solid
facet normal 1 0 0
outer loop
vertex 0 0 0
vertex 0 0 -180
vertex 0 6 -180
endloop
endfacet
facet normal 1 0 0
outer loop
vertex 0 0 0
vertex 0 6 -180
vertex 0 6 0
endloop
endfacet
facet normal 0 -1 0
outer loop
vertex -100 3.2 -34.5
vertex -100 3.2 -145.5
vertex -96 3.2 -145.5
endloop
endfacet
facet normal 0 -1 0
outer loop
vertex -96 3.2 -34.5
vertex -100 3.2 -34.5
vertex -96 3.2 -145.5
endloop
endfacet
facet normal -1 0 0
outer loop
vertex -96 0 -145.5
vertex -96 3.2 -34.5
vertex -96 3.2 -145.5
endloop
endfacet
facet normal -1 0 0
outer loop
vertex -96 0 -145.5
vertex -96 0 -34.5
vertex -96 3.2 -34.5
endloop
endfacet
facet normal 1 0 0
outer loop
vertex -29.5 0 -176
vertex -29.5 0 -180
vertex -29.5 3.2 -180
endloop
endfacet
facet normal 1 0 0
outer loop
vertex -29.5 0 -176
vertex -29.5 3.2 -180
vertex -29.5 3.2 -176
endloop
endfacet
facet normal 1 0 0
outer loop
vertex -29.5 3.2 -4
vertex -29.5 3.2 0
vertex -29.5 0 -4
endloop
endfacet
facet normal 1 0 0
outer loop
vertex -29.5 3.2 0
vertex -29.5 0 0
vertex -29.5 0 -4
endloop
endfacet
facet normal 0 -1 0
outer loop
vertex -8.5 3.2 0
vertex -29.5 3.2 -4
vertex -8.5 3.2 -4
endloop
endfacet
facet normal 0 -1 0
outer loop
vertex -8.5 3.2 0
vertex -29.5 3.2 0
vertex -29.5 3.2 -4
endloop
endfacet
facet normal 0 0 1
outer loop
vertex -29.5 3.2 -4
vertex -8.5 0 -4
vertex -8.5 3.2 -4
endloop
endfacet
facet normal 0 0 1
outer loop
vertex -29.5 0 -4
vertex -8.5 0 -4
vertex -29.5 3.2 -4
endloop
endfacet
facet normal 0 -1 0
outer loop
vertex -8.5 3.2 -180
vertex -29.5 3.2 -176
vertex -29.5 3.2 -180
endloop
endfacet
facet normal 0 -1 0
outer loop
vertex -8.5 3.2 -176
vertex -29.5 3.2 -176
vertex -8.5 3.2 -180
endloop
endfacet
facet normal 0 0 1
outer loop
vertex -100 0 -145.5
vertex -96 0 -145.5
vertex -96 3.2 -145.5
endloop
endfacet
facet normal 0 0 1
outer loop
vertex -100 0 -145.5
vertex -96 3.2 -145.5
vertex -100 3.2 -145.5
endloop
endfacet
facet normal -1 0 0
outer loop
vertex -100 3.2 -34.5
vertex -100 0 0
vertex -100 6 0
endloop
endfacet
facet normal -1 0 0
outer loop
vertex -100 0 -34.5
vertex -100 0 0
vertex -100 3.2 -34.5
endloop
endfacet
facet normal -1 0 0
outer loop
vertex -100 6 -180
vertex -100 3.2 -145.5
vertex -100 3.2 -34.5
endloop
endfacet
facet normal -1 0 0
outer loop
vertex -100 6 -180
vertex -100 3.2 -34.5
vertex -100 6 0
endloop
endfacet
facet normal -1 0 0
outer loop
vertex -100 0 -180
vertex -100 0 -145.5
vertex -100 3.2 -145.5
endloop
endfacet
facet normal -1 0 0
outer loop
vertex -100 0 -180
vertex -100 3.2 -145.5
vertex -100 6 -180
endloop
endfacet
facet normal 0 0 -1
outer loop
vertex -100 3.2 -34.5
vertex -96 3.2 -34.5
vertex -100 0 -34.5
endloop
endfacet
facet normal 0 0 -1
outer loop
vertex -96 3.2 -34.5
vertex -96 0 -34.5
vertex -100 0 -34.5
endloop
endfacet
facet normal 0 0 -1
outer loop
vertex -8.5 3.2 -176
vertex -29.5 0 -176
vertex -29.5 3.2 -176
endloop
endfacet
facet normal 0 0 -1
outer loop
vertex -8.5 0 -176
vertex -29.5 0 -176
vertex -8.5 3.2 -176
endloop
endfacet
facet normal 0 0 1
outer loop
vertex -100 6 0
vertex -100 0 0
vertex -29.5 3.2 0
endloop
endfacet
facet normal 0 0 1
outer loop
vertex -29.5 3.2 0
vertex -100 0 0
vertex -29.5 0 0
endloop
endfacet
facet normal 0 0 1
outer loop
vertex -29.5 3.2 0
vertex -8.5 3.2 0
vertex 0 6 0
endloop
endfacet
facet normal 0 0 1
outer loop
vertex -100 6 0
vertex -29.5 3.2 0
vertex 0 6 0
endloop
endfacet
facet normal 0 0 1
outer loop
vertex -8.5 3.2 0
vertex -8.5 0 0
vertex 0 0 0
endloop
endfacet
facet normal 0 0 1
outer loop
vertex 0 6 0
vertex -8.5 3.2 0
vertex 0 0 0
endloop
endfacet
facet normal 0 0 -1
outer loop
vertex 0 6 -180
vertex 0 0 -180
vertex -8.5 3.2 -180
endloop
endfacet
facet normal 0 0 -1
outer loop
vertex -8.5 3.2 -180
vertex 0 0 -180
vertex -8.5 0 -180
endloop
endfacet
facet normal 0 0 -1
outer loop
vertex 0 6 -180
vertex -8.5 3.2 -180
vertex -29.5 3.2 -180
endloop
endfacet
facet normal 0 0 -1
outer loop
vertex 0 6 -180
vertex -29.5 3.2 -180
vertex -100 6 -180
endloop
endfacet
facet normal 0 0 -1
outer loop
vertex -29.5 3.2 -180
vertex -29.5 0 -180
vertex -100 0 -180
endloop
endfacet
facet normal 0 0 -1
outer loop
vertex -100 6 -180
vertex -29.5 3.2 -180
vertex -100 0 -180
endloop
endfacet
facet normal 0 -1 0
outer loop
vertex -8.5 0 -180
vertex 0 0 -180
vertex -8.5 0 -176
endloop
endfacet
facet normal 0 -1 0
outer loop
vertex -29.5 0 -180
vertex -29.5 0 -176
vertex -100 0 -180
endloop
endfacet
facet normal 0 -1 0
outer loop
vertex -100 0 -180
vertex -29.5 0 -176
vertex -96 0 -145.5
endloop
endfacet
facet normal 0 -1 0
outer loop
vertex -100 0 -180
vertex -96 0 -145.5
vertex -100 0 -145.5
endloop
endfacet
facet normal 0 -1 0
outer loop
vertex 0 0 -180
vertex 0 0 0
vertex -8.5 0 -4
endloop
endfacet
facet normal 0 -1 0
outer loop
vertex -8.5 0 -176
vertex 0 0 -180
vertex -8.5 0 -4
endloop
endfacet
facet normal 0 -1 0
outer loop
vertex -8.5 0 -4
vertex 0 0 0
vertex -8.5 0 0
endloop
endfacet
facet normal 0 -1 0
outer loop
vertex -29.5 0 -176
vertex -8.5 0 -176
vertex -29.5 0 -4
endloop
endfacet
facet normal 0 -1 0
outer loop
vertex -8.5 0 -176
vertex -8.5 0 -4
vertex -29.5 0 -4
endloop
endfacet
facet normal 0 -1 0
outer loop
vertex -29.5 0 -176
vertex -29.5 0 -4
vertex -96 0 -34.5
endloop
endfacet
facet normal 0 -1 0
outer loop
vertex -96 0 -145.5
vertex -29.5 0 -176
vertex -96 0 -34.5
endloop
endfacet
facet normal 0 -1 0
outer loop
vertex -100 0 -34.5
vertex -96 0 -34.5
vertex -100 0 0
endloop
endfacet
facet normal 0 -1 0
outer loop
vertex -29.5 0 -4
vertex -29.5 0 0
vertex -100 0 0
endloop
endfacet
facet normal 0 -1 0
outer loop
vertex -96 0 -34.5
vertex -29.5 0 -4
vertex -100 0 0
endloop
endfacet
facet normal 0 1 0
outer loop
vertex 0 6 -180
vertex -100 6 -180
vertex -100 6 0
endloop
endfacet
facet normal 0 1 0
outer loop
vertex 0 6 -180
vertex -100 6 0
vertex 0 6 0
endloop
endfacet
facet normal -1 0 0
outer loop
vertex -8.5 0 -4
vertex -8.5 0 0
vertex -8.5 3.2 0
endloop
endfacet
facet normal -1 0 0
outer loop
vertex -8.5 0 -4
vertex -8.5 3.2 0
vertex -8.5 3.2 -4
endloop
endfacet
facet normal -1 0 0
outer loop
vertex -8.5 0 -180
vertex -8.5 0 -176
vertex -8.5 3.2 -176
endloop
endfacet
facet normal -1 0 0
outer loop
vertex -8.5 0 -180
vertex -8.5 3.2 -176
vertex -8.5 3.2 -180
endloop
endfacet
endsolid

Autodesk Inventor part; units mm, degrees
ref_plane "YZ Plane" through (0, 0, 0) normal (1, 0, 0) x (0, 1, 0)
ref_plane "XZ Plane" through (0, 0, 0) normal (0, 1, 0) x (-1, 0, 0)
ref_plane "XY Plane" through (0, 0, 0) normal (0, 0, 1) x (1, 0, 0)
sketch "Sketch1" plane through (0, 0, 0) normal (0, 1, 0) x (-1, 0, 0)
  line L0 (0, 0) -> (100, 0)
  line L1 (100, 0) -> (100, -180)
  line L2 (100, -180) -> (0, -180)
  line L3 (0, -180) -> (0, 0)
  dimension "d0" = 100
  dimension "d1" = 180
extrude "Extrusion1" add sketch "Sketch1" along normal blind 4
sketch "Sketch2" plane through (0, 4, 0) normal (0, 1, 0) x (1, 0, 0)
  line L0 (-100, 180) -> (-100, 0) projected
  line L1 (0, 180) -> (-100, 180) projected
  line L2 (-100, 0) -> (-96, 0)
  line L3 (-96, 0) -> (-96, 180)
  line L4 (-96, 180) -> (-100, 180)
  line L5 (-100, 180) -> (-100, 0)
  line L6 (0, 180) -> (-4, 180)
  line L7 (-4, 180) -> (-4, 0)
  line L8 (-4, 0) -> (0, 0)
  line L9 (0, 0) -> (0, 180)
  dimension "d4" = 4
  dimension "d5" = 4
extrude "Extrusion2" add sketch "Sketch2" along normal blind 5 contours L1 L9 L8 L7
sketch "Sketch3" plane through (0, 4, 0) normal (0, 1, 0) x (1, 0, 0)
  line L0 (-4, 180) -> (-4, 0) projected
  line L1 (-4, 0) -> (-34, 0)
  line L2 (-34, 0) -> (-34, 4)
  line L3 (-34, 4) -> (-4, 4)
  line L4 (-4, 4) -> (-4, 0)
  line L5 (-4, 180) -> (-100, 180) projected
  line L6 (-4, 180) -> (-34, 180)
  line L7 (-34, 180) -> (-34, 176)
  line L8 (-34, 176) -> (-4, 176)
  line L9 (-4, 176) -> (-4, 180)
  line L10 (-100, 0) -> (0, 0) projected
  line L11 (-100, 0) -> (-96, 0)
  line L12 (-96, 0) -> (-96, 180)
  line L13 (-96, 180) -> (-100, 180)
  line L14 (-100, 180) -> (-100, 0)
  point P0 (-4, 176)
  point P1 (-4, 4)
  dimension "d8" = 30
  dimension "d9" = 4
  dimension "d10" = 4
  dimension "d11" = 4
extrude "Extrusion3" add sketch "Sketch3" along normal blind 25 contours L0 L8 L7 L5 | L0 L1 L2 L3 | L12 L10 L14 L5
sketch "Sketch4" plane through (0, 29, 0) normal (0, 1, 0) x (1, 0, 0)
  line L0 (-100, 0) -> (-96, 0) projected
  line L1 (-96, 0) -> (-96, 180) projected
  line L2 (-96, 180) -> (-100, 180) projected
  line L3 (-100, 180) -> (-100, 0) projected
  line L4 (-4, 176) -> (-4, 180) projected
  line L5 (-4, 180) -> (-34, 180) projected
  line L6 (-34, 180) -> (-34, 176) projected
  line L7 (-34, 176) -> (-4, 176) projected
  line L8 (-34, 0) -> (-4, 0) projected
  line L9 (-34, 4) -> (-34, 0) projected
  line L10 (-34, 0) -> (-4, 0) projected
  line L11 (-4, 0) -> (-4, 4) projected
  line L12 (-4, 4) -> (-34, 4) projected
  line L13 (-100, 90) -> (-100, 145)
  line L14 (-100, 145) -> (-96, 145)
  line L15 (-96, 145) -> (-96, 35)
  line L16 (-96, 0) -> (-96, 180) projected
  line L17 (-96, 35) -> (-100, 35)
  line L18 (-100, 35) -> (-100, 90)
  line L19 (-4, 176) -> (-34, 176) projected
  line L20 (-19, 176) -> (-29, 176)
  line L21 (-29, 176) -> (-29, 180)
  line L22 (-29, 180) -> (-9, 180)
  line L23 (0, 180) -> (-100, 180) projected
  line L24 (-9, 180) -> (-9, 176)
  line L25 (-19, 176) -> (-9, 176)
  line L26 (-19, 4) -> (-29, 4)
  line L27 (-29, 4) -> (-29, 0)
  line L28 (-29, 0) -> (-9, 0)
  line L29 (-9, 0) -> (-9, 4)
  line L30 (-4, 4) -> (-34, 4) projected
  line L31 (-9, 4) -> (-19, 4)
  point P0 (0, 0)
  dimension "d14" = 55
  dimension "d15" = 110
  dimension "d16" = 10
  dimension "d17" = 20
extrude "Extrusion4" add sketch "Sketch4" along normal blind 3 contours L3 L14 L1 L17 | L5 L24 L7 L21 | L27 L12 L29 L8
sketch "Sketch5" plane through (0, 0, 0) normal (0, -1, 0) x (1, 0, 0)
  line L0 (-9, -4) -> (-29, -4) projected
  line L1 (-29, -4) -> (-29, 0) projected
  line L2 (-29, 0) -> (-9, 0) projected
  line L3 (-9, 0) -> (-9, -4) projected
  line L4 (-9, -180) -> (-29, -180) projected
  line L5 (-29, -180) -> (-29, -176) projected
  line L6 (-29, -176) -> (-9, -176) projected
  line L7 (-9, -176) -> (-9, -180) projected
  line L8 (-96, -35) -> (-96, -145) projected
  line L9 (-96, -145) -> (-100, -145) projected
  line L10 (-100, -145) -> (-100, -35) projected
  line L11 (-100, -35) -> (-96, -35) projected
  line L12 (-96, -180) -> (-96, 0) projected
  line L13 (-100, -35) -> (-96, -35)
  line L14 (-96, -35) -> (-96, -34.5)
  line L15 (-96, -34.5) -> (-100, -34.5)
  line L16 (-100, -34.5) -> (-100, -35)
  line L17 (-100, -145) -> (-96, -145)
  line L18 (-96, -145) -> (-96, -145.5)
  line L19 (-96, -145.5) -> (-100, -145.5)
  line L20 (-100, -145.5) -> (-100, -145)
  line L21 (-4, -176) -> (-34, -176) projected
  line L22 (-29, -180) -> (-29.5, -180)
  line L23 (-29.5, -180) -> (-29.5, -176)
  line L24 (-29.5, -176) -> (-29, -176)
  line L25 (-29, -176) -> (-29, -180)
  line L26 (-9, -176) -> (-8.5, -176)
  line L27 (-8.5, -176) -> (-8.5, -180)
  line L28 (-8.5, -180) -> (-9, -180)
  line L29 (-9, -180) -> (-9, -176)
  line L30 (-34, -4) -> (-4, -4) projected
  line L31 (-29, 0) -> (-29.5, 0)
  line L32 (-29.5, 0) -> (-29.5, -4)
  line L33 (-29.5, -4) -> (-29, -4)
  line L34 (-29, -4) -> (-29, 0)
  line L35 (-9, 0) -> (-8.5, 0)
  line L36 (-8.5, 0) -> (-8.5, -4)
  line L37 (-8.5, -4) -> (-9, -4)
  line L38 (-9, -4) -> (-9, 0)
  point P0 (0, 0)
  dimension "d22" = 0.5
  dimension "d23" = 0.5
  dimension "d24" = 0.5
  dimension "d25" = 0.5
  dimension "d26" = 0.5
  dimension "d27" = 0.5
extrude "Extrusion5" cut sketch "Sketch5" against normal blind 3.2
sketch "Sketch6" plane through (0, 32, 0) normal (0, 1, 0) x (1, 0, 0)
  line L0 (-126.3586, 197.6117) -> (20.3273, 197.6117)
  line L1 (20.3273, 197.6117) -> (20.3273, -20.388)
  line L2 (20.3273, -20.388) -> (-126.3586, -20.388)
  line L3 (-126.3586, -20.388) -> (-126.3586, 197.6117)
  point P0 (0, 0)
extrude "Extrusion6" cut sketch "Sketch6" against normal up to surface (28 mm away)
sketch "Sketch7" plane through (0, 4, 0) normal (0, 1, 0) x (1, 0, 0)
  line L0 (0, 180) -> (-100, 180) projected
  line L1 (-100, 0) -> (-100, 180) projected
  line L2 (-100, 0) -> (0, 0) projected
  line L3 (0, 180) -> (0, 0) projected
extrude "Extrusion7" add sketch "Sketch7" along normal blind 2
properties part number "caja_attiny"
